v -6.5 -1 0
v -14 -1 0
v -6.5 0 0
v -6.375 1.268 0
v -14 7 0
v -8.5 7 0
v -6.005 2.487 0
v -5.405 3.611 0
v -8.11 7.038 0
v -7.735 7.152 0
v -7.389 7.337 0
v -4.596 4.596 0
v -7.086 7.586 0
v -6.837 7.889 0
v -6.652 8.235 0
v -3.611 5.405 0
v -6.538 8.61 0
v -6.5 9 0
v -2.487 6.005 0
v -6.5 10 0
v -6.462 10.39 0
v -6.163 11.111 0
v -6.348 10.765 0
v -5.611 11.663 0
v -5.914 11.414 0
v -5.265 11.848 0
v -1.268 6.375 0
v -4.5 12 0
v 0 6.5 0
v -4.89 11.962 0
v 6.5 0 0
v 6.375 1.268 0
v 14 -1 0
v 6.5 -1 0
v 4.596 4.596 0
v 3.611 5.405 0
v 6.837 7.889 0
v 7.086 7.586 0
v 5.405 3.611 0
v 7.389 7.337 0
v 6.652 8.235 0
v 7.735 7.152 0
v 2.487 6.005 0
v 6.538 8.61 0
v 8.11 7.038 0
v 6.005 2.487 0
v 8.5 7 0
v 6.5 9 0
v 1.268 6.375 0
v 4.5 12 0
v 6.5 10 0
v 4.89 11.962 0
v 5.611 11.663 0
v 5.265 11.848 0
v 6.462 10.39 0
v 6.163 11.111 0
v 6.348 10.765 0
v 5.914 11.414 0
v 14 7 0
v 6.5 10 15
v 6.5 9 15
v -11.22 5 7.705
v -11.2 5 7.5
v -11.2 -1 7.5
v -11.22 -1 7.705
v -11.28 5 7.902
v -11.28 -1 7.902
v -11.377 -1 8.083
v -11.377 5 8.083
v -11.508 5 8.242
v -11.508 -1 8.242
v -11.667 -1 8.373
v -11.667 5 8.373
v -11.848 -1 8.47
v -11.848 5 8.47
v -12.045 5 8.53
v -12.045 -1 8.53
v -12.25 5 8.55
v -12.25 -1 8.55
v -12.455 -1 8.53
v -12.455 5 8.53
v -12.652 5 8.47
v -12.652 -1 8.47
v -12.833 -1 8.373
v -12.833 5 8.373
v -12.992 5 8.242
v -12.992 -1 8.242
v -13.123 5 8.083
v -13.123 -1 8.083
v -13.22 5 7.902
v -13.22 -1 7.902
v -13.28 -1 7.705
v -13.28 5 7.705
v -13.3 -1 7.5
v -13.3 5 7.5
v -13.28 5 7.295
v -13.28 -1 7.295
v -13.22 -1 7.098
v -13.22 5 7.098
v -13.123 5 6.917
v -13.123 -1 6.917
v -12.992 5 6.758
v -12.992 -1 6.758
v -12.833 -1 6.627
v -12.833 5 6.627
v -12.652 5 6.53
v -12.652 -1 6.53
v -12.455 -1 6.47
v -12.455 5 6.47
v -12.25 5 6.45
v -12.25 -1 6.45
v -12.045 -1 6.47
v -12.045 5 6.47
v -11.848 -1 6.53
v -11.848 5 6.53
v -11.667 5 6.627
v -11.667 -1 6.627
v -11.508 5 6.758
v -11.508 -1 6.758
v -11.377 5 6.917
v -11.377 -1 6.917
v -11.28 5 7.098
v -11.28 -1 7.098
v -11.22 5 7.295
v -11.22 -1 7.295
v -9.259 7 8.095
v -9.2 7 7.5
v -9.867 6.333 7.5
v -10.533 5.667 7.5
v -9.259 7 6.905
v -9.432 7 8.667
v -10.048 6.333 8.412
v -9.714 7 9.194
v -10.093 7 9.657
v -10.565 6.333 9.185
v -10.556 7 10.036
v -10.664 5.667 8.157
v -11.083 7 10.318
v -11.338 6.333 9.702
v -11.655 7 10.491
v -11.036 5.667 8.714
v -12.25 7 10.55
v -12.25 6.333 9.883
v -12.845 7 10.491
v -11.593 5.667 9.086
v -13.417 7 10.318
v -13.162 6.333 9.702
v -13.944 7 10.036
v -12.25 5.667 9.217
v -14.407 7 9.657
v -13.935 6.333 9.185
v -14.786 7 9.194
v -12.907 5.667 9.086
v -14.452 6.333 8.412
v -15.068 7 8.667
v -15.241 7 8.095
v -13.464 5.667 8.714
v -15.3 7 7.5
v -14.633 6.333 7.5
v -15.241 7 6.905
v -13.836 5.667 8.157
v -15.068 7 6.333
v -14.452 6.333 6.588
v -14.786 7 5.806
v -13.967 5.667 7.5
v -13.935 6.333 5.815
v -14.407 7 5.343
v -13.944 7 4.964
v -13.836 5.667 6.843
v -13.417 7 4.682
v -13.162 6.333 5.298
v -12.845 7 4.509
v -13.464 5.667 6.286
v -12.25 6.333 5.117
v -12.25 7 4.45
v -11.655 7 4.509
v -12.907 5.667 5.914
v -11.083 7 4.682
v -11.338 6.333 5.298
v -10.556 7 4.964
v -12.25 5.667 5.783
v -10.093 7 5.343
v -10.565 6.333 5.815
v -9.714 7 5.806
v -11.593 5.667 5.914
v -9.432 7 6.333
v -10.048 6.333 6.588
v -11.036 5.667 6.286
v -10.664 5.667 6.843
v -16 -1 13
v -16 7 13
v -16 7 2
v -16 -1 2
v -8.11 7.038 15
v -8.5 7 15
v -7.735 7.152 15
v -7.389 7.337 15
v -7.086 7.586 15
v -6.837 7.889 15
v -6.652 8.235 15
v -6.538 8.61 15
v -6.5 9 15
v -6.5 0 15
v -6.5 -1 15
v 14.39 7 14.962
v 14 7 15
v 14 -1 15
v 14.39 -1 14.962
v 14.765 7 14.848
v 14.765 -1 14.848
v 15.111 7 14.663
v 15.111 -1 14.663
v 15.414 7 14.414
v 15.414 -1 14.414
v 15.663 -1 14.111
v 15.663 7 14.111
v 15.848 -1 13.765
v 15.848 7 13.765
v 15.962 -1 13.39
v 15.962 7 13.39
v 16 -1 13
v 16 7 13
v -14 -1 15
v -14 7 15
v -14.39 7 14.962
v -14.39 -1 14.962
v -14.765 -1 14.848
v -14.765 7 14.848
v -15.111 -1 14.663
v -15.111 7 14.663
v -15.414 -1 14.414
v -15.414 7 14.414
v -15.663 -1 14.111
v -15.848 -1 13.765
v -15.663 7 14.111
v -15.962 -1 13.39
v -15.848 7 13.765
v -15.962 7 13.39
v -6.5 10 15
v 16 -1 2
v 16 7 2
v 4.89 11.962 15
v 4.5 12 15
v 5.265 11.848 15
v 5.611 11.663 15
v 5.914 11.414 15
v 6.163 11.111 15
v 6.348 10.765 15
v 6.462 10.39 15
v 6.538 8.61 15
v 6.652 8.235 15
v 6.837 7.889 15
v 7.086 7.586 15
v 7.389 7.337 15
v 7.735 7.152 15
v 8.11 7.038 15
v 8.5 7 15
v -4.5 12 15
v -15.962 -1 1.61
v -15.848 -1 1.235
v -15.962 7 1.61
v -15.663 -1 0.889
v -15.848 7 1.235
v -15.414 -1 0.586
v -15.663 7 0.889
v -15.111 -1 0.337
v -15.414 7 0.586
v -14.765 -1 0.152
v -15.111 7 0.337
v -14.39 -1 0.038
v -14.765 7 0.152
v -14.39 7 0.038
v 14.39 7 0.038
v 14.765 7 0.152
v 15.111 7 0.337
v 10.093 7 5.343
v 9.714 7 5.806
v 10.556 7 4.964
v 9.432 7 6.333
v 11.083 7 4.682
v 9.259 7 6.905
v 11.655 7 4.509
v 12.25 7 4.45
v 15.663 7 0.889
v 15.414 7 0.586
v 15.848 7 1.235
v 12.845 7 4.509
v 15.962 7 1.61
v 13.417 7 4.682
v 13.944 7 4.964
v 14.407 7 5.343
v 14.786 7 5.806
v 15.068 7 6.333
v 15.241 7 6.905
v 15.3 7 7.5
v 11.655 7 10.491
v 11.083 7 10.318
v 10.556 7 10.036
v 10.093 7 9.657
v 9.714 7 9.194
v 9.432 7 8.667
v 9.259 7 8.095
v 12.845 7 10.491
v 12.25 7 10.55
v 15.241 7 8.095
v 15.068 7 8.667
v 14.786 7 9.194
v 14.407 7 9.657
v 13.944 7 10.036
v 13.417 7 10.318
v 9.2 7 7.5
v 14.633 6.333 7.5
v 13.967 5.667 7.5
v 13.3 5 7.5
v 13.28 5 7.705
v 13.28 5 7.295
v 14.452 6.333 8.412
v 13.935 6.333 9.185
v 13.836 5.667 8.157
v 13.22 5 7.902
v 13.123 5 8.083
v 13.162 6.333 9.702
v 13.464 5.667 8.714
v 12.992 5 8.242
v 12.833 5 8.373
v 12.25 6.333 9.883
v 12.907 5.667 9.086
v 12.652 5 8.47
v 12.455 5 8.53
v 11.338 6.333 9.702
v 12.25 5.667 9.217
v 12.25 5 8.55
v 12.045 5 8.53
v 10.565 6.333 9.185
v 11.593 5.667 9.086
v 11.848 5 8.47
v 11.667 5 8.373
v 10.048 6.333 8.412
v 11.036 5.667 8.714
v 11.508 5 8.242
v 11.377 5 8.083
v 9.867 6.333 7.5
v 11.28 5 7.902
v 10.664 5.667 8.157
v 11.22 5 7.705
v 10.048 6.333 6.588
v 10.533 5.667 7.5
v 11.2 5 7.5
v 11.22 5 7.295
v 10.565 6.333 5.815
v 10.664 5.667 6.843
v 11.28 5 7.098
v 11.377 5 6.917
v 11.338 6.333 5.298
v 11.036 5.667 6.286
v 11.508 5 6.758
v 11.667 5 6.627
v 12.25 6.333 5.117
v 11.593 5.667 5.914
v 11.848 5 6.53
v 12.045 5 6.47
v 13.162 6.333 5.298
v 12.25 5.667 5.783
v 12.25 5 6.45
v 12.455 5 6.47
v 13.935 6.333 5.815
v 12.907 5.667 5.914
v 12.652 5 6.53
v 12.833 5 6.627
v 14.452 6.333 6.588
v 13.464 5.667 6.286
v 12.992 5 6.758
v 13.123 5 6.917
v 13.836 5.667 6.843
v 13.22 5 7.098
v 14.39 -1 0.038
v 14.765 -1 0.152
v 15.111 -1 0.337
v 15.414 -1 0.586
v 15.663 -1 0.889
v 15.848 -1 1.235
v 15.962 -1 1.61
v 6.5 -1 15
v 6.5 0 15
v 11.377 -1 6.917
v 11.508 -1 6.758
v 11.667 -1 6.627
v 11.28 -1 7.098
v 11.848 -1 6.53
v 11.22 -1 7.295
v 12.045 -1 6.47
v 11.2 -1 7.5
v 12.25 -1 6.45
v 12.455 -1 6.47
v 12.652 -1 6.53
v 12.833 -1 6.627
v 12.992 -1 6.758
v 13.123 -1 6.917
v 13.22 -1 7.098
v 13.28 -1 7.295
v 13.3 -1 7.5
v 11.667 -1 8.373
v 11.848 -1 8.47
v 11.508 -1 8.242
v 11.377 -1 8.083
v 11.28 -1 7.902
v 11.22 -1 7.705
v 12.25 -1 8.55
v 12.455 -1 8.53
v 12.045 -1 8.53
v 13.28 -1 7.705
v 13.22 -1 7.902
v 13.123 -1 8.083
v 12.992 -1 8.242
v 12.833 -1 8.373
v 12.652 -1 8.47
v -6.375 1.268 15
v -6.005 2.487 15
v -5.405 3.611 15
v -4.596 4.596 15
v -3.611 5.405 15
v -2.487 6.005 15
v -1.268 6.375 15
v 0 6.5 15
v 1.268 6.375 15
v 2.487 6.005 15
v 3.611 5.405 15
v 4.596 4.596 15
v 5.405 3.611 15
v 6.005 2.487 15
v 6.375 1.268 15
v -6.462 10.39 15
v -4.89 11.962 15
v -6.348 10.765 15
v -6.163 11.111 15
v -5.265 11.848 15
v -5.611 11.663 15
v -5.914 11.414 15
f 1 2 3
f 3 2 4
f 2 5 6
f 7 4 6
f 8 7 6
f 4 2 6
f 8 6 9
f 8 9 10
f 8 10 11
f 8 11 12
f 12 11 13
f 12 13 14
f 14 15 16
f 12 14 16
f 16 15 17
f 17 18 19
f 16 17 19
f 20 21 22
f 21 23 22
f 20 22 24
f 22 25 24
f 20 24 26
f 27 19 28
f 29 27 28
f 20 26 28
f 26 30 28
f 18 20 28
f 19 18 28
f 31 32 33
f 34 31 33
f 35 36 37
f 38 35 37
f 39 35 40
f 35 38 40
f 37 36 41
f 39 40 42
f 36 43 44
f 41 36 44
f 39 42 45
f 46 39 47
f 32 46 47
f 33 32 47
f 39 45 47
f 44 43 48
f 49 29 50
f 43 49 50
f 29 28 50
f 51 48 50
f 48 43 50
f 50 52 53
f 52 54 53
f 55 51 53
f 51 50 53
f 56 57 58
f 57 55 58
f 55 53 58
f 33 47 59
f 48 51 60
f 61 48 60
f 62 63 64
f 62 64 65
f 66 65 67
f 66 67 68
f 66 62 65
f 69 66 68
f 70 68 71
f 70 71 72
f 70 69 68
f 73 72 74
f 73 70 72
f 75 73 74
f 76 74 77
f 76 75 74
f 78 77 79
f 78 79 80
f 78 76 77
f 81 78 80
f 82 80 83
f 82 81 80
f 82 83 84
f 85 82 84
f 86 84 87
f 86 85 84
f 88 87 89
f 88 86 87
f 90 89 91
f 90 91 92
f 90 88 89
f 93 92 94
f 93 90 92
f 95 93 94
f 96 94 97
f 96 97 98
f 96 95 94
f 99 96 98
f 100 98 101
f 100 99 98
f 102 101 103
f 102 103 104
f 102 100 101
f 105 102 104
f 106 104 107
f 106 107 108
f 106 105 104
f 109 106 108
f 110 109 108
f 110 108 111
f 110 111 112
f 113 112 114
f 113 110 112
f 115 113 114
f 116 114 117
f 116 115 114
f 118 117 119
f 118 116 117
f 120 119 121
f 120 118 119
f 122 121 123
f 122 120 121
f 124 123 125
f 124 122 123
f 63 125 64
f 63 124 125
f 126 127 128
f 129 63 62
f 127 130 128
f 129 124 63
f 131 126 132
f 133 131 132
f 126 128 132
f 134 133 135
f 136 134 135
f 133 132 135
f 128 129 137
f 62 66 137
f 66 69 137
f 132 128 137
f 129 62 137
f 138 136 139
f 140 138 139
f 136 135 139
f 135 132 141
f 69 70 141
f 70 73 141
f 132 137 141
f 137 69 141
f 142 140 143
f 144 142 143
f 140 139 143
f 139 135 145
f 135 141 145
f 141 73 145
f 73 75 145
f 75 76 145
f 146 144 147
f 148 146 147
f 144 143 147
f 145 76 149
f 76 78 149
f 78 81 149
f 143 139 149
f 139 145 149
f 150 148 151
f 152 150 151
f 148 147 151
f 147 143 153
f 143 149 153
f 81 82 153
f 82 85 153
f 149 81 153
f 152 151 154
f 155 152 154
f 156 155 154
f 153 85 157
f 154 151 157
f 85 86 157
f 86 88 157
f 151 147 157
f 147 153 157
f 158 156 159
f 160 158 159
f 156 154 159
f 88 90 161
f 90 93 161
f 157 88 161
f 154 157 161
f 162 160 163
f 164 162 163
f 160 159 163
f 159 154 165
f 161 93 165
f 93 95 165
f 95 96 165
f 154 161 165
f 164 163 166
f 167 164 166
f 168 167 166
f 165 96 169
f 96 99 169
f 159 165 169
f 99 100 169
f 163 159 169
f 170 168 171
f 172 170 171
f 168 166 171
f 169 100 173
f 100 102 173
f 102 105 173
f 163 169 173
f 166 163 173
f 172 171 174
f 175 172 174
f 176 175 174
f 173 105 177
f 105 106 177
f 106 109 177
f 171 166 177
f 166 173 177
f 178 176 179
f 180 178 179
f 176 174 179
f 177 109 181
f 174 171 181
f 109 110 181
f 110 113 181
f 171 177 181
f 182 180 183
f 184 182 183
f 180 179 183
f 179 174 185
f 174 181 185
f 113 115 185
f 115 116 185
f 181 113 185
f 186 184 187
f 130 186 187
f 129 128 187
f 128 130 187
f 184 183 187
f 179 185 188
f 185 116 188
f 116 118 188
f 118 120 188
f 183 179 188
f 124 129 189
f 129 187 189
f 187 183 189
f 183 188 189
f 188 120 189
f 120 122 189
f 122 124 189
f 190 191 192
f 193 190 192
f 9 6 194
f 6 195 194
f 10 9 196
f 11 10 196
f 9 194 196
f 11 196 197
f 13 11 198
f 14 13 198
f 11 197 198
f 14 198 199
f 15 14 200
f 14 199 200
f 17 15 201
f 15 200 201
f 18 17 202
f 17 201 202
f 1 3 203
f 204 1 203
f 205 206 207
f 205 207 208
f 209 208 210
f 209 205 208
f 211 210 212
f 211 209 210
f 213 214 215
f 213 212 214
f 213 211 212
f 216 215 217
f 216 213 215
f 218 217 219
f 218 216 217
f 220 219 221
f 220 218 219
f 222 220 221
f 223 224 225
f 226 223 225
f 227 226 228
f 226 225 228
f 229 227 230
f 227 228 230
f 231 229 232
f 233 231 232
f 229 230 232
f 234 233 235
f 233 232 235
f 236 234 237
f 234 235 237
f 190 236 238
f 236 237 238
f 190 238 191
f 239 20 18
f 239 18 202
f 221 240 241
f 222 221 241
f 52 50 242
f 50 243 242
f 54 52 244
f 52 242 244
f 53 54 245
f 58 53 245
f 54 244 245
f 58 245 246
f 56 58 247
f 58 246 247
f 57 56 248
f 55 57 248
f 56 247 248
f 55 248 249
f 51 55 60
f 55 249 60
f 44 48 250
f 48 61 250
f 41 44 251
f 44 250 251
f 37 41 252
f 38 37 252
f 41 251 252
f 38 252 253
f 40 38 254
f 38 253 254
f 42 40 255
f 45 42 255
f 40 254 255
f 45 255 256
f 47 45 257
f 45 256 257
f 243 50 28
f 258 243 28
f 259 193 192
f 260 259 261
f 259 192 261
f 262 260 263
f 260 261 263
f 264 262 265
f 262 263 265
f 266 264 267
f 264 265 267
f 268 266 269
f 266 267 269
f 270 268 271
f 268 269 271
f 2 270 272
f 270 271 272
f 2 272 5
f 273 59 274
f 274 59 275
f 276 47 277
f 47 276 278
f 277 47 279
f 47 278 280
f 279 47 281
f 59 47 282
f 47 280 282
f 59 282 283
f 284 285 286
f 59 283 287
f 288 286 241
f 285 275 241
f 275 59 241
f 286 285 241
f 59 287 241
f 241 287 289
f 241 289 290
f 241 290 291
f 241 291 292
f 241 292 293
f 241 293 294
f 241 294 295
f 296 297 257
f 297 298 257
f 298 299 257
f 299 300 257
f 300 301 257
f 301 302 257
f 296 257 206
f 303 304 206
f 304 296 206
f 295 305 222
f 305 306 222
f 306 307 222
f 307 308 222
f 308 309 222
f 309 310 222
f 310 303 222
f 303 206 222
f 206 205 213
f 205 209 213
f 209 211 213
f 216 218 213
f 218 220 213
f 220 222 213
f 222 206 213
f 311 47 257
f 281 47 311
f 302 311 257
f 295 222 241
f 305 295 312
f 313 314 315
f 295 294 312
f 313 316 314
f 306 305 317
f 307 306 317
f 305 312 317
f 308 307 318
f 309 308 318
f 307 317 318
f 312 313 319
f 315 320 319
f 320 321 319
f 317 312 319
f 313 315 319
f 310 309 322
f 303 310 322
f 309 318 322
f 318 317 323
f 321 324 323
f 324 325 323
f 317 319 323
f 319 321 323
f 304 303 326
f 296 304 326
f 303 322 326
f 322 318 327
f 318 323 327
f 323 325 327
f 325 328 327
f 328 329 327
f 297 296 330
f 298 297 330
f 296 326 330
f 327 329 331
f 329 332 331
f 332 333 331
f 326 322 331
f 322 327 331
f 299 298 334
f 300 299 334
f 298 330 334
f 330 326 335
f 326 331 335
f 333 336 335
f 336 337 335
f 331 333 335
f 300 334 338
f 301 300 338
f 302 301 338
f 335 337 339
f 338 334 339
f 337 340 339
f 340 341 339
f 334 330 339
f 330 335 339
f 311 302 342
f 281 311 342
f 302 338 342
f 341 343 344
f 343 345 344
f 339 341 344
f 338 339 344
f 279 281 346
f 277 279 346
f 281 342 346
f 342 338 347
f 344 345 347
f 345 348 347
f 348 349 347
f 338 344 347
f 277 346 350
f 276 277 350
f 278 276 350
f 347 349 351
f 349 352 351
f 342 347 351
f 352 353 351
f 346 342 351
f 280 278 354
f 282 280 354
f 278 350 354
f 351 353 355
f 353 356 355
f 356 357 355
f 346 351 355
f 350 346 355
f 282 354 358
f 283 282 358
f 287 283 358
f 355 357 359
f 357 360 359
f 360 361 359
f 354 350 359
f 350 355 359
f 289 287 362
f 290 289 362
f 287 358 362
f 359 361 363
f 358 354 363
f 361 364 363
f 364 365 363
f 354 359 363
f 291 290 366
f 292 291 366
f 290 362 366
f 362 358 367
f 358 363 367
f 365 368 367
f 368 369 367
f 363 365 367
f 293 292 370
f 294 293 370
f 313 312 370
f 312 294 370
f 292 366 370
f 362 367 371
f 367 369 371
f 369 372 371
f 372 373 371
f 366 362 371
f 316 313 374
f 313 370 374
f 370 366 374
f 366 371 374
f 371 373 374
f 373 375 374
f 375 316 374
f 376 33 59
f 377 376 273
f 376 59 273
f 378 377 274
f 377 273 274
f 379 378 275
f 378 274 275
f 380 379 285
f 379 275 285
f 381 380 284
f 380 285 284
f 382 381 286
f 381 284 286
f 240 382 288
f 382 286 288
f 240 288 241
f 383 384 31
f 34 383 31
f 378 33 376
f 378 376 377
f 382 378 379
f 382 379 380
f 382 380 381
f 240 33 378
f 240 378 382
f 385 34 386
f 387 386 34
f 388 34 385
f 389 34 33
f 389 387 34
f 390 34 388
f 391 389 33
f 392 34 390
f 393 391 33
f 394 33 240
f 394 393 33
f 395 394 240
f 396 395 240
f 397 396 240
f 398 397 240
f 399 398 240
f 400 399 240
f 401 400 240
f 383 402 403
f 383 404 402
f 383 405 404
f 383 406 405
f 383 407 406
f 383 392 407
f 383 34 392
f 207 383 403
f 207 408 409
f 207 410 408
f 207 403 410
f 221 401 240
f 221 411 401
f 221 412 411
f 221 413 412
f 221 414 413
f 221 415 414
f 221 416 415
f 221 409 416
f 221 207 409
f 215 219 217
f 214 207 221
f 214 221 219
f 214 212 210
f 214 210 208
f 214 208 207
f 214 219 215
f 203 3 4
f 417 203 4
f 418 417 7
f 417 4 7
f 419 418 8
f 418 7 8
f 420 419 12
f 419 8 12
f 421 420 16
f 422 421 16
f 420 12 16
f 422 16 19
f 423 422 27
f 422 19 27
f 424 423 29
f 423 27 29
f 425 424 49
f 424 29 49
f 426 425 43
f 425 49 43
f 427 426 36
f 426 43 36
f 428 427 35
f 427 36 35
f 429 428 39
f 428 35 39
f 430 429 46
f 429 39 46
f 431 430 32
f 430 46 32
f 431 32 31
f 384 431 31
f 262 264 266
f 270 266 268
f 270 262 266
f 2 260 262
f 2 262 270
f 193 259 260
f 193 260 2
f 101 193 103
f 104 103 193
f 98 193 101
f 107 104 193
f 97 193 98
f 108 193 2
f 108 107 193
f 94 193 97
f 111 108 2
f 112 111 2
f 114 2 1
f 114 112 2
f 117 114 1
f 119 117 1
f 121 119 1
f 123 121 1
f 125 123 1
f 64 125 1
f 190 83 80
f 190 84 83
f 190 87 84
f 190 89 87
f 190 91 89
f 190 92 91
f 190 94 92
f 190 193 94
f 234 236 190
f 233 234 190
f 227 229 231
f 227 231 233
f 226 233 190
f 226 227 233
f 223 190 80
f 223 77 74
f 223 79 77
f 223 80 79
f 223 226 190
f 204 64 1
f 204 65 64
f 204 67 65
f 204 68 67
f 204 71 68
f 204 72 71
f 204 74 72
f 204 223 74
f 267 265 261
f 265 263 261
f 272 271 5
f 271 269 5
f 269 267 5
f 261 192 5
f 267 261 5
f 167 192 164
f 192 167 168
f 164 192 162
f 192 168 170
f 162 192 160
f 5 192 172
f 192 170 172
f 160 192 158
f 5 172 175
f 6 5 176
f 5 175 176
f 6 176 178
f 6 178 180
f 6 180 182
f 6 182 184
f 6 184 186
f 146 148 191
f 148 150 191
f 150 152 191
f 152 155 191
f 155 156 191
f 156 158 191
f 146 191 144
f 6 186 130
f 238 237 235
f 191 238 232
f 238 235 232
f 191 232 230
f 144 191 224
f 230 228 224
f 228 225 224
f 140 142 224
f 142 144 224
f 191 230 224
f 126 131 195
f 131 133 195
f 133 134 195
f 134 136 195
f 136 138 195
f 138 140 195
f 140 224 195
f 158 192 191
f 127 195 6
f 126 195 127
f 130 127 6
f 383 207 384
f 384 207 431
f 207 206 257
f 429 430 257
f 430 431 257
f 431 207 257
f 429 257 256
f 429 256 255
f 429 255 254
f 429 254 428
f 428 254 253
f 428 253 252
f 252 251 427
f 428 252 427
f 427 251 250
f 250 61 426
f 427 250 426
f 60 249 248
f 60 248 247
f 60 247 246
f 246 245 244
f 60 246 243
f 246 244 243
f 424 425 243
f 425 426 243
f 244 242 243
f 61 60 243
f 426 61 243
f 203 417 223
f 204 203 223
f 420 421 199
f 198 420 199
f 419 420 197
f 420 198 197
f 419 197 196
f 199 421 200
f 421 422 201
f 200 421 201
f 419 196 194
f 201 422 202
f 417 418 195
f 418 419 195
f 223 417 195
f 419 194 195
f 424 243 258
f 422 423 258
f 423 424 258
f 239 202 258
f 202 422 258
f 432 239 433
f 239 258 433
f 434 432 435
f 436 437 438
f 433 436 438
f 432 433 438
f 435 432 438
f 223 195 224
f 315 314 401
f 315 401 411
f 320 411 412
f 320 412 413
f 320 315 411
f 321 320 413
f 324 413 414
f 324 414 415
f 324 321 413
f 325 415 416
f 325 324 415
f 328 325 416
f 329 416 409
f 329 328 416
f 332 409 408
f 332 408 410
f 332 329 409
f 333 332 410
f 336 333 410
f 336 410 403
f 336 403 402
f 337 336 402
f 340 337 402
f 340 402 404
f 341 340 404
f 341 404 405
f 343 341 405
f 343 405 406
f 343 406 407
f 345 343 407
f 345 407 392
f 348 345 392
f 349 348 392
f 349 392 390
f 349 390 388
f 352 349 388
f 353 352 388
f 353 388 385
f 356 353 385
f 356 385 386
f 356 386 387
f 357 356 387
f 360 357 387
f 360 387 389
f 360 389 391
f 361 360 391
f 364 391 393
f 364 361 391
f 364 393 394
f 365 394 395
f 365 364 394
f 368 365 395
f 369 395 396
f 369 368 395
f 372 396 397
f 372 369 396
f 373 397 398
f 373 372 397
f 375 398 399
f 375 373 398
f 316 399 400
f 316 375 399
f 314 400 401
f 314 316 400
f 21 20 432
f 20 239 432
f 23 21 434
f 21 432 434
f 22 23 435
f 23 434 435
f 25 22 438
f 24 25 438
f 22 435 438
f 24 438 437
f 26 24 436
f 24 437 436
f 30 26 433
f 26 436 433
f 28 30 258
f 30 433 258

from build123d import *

# Parameters (mm, degrees)
BOSS_EXTRUDE1_DEPTH     = 15
CUT_EXTRUDE1_DEPTH      = 19
CUT_EXTRUDE1_DEPTH_BACK = 26
CUT_EXTRUDE1_START      = -12
SKETCH2_R               = 1.05
FILLET1_R               = 2
SKETCH3_R               = 1.05
BOSS_EXTRUDE2_DEPTH     = 1
CUT_EXTRUDE2_START      = -12
SKETCH2_3_W             = 9.5
SKETCH2_3_H             = 15
SKETCH2_3_R             = 1.05
CUT_EXTRUDE2_DEPTH      = 5
FILLET2_R               = 2
CHAMFER1_SIZE           = 2


with BuildPart() as part:
    # Sketch1 → Boss-Extrude1 (new body)
    with BuildSketch(Plane.XY):
        with BuildLine():
            Line((-16, 12), (-16, 0))
            Line((-16, 0), (-6.5, 0))
            ThreePointArc((-6.5, 0), (0, 6.5), (6.5, 0))
            Line((6.5, 0), (16, 0))
            Line((16, 0), (16, 12))
            Line((16, 12), (-16, 12))
        make_face()
    extrude(amount=BOSS_EXTRUDE1_DEPTH)

    # Sketch2 → Cut-Extrude1 (cut, two sides: drawn at the far end of the back side and taken through both)
    with BuildSketch(Plane.XZ.offset(CUT_EXTRUDE1_START - CUT_EXTRUDE1_DEPTH_BACK)):
        with Locations((-12.25, 7.5)):
            Circle(SKETCH2_R)
        with Locations((12.25, 7.5)):
            Circle(SKETCH2_R)
    extrude(amount=CUT_EXTRUDE1_DEPTH + CUT_EXTRUDE1_DEPTH_BACK, mode=Mode.SUBTRACT)

    # Fillet1
    fillet1_edges = [part.edges().sort_by_distance(p)[0] for p in [
        (16, 6, 15),
        (-16, 6, 15),
        (-16, 6, 0),
        (16, 6, 0),
    ]]
    fillet(fillet1_edges, radius=FILLET1_R)

    # Sketch3 → Boss-Extrude2 (add)
    # profile 1 of 2: a face of its own
    with BuildSketch(Plane.XZ):
        with BuildLine():
            Line((-14, 0), (-6.5, 0))
            Line((-6.5, 0), (-6.5, 15))
            Line((-6.5, 15), (-14, 15))
            ThreePointArc((-14, 15), (-15.414213562, 14.414213562), (-16, 13))
            Line((-16, 13), (-16, 2))
            ThreePointArc((-16, 2), (-15.414213562, 0.585786438), (-14, 0))
        make_face()
        with Locations((-12.25, 7.5)):
            Circle(SKETCH3_R, mode=Mode.SUBTRACT)
    # profile 2 of 2: a face of its own
    with BuildSketch(Plane.XZ):
        with BuildLine():
            Line((6.5, 0), (14, 0))
            ThreePointArc((14, 0), (15.414213562, 0.585786438), (16, 2))
            Line((16, 2), (16, 13))
            ThreePointArc((16, 13), (15.414213562, 14.414213562), (14, 15))
            Line((14, 15), (6.5, 15))
            Line((6.5, 15), (6.5, 0))
        make_face()
        with Locations((12.25, 7.5)):
            Circle(SKETCH3_R, mode=Mode.SUBTRACT)
    extrude(amount=BOSS_EXTRUDE2_DEPTH)

    # Sketch2<3> → Cut-Extrude2 (cut)
    # profile 1 of 2: a face of its own
    with BuildSketch(Plane.XZ.offset(CUT_EXTRUDE2_START)):
        with Locations((-11.25, 7.5)):
            Rectangle(SKETCH2_3_W, SKETCH2_3_H)
        with Locations((-12.25, 7.5)):
            Circle(SKETCH2_3_R, mode=Mode.SUBTRACT)
    # profile 2 of 2: a face of its own
    with BuildSketch(Plane.XZ.offset(CUT_EXTRUDE2_START)):
        with Locations((11.25, 7.5)):
            Rectangle(SKETCH2_3_W, SKETCH2_3_H)
        with Locations((12.25, 7.5)):
            Circle(SKETCH2_3_R, mode=Mode.SUBTRACT)
    extrude(amount=CUT_EXTRUDE2_DEPTH, mode=Mode.SUBTRACT)

    # Fillet2
    fillet2_edges = [part.edges().sort_by_distance(p)[0] for p in [
        (-6.5, 7, 7.5),
        (-6.5, 12, 7.5),
        (6.5, 7, 7.5),
        (6.5, 12, 7.5),
    ]]
    fillet(fillet2_edges, radius=FILLET2_R)

    # Chamfer1
    chamfer1_edges = [part.edges().sort_by_distance(p)[0] for p in [
        (-13.3, 7, 7.5),
        (11.2, 7, 7.5),
    ]]
    chamfer(chamfer1_edges, length=CHAMFER1_SIZE)


solid = part.part
